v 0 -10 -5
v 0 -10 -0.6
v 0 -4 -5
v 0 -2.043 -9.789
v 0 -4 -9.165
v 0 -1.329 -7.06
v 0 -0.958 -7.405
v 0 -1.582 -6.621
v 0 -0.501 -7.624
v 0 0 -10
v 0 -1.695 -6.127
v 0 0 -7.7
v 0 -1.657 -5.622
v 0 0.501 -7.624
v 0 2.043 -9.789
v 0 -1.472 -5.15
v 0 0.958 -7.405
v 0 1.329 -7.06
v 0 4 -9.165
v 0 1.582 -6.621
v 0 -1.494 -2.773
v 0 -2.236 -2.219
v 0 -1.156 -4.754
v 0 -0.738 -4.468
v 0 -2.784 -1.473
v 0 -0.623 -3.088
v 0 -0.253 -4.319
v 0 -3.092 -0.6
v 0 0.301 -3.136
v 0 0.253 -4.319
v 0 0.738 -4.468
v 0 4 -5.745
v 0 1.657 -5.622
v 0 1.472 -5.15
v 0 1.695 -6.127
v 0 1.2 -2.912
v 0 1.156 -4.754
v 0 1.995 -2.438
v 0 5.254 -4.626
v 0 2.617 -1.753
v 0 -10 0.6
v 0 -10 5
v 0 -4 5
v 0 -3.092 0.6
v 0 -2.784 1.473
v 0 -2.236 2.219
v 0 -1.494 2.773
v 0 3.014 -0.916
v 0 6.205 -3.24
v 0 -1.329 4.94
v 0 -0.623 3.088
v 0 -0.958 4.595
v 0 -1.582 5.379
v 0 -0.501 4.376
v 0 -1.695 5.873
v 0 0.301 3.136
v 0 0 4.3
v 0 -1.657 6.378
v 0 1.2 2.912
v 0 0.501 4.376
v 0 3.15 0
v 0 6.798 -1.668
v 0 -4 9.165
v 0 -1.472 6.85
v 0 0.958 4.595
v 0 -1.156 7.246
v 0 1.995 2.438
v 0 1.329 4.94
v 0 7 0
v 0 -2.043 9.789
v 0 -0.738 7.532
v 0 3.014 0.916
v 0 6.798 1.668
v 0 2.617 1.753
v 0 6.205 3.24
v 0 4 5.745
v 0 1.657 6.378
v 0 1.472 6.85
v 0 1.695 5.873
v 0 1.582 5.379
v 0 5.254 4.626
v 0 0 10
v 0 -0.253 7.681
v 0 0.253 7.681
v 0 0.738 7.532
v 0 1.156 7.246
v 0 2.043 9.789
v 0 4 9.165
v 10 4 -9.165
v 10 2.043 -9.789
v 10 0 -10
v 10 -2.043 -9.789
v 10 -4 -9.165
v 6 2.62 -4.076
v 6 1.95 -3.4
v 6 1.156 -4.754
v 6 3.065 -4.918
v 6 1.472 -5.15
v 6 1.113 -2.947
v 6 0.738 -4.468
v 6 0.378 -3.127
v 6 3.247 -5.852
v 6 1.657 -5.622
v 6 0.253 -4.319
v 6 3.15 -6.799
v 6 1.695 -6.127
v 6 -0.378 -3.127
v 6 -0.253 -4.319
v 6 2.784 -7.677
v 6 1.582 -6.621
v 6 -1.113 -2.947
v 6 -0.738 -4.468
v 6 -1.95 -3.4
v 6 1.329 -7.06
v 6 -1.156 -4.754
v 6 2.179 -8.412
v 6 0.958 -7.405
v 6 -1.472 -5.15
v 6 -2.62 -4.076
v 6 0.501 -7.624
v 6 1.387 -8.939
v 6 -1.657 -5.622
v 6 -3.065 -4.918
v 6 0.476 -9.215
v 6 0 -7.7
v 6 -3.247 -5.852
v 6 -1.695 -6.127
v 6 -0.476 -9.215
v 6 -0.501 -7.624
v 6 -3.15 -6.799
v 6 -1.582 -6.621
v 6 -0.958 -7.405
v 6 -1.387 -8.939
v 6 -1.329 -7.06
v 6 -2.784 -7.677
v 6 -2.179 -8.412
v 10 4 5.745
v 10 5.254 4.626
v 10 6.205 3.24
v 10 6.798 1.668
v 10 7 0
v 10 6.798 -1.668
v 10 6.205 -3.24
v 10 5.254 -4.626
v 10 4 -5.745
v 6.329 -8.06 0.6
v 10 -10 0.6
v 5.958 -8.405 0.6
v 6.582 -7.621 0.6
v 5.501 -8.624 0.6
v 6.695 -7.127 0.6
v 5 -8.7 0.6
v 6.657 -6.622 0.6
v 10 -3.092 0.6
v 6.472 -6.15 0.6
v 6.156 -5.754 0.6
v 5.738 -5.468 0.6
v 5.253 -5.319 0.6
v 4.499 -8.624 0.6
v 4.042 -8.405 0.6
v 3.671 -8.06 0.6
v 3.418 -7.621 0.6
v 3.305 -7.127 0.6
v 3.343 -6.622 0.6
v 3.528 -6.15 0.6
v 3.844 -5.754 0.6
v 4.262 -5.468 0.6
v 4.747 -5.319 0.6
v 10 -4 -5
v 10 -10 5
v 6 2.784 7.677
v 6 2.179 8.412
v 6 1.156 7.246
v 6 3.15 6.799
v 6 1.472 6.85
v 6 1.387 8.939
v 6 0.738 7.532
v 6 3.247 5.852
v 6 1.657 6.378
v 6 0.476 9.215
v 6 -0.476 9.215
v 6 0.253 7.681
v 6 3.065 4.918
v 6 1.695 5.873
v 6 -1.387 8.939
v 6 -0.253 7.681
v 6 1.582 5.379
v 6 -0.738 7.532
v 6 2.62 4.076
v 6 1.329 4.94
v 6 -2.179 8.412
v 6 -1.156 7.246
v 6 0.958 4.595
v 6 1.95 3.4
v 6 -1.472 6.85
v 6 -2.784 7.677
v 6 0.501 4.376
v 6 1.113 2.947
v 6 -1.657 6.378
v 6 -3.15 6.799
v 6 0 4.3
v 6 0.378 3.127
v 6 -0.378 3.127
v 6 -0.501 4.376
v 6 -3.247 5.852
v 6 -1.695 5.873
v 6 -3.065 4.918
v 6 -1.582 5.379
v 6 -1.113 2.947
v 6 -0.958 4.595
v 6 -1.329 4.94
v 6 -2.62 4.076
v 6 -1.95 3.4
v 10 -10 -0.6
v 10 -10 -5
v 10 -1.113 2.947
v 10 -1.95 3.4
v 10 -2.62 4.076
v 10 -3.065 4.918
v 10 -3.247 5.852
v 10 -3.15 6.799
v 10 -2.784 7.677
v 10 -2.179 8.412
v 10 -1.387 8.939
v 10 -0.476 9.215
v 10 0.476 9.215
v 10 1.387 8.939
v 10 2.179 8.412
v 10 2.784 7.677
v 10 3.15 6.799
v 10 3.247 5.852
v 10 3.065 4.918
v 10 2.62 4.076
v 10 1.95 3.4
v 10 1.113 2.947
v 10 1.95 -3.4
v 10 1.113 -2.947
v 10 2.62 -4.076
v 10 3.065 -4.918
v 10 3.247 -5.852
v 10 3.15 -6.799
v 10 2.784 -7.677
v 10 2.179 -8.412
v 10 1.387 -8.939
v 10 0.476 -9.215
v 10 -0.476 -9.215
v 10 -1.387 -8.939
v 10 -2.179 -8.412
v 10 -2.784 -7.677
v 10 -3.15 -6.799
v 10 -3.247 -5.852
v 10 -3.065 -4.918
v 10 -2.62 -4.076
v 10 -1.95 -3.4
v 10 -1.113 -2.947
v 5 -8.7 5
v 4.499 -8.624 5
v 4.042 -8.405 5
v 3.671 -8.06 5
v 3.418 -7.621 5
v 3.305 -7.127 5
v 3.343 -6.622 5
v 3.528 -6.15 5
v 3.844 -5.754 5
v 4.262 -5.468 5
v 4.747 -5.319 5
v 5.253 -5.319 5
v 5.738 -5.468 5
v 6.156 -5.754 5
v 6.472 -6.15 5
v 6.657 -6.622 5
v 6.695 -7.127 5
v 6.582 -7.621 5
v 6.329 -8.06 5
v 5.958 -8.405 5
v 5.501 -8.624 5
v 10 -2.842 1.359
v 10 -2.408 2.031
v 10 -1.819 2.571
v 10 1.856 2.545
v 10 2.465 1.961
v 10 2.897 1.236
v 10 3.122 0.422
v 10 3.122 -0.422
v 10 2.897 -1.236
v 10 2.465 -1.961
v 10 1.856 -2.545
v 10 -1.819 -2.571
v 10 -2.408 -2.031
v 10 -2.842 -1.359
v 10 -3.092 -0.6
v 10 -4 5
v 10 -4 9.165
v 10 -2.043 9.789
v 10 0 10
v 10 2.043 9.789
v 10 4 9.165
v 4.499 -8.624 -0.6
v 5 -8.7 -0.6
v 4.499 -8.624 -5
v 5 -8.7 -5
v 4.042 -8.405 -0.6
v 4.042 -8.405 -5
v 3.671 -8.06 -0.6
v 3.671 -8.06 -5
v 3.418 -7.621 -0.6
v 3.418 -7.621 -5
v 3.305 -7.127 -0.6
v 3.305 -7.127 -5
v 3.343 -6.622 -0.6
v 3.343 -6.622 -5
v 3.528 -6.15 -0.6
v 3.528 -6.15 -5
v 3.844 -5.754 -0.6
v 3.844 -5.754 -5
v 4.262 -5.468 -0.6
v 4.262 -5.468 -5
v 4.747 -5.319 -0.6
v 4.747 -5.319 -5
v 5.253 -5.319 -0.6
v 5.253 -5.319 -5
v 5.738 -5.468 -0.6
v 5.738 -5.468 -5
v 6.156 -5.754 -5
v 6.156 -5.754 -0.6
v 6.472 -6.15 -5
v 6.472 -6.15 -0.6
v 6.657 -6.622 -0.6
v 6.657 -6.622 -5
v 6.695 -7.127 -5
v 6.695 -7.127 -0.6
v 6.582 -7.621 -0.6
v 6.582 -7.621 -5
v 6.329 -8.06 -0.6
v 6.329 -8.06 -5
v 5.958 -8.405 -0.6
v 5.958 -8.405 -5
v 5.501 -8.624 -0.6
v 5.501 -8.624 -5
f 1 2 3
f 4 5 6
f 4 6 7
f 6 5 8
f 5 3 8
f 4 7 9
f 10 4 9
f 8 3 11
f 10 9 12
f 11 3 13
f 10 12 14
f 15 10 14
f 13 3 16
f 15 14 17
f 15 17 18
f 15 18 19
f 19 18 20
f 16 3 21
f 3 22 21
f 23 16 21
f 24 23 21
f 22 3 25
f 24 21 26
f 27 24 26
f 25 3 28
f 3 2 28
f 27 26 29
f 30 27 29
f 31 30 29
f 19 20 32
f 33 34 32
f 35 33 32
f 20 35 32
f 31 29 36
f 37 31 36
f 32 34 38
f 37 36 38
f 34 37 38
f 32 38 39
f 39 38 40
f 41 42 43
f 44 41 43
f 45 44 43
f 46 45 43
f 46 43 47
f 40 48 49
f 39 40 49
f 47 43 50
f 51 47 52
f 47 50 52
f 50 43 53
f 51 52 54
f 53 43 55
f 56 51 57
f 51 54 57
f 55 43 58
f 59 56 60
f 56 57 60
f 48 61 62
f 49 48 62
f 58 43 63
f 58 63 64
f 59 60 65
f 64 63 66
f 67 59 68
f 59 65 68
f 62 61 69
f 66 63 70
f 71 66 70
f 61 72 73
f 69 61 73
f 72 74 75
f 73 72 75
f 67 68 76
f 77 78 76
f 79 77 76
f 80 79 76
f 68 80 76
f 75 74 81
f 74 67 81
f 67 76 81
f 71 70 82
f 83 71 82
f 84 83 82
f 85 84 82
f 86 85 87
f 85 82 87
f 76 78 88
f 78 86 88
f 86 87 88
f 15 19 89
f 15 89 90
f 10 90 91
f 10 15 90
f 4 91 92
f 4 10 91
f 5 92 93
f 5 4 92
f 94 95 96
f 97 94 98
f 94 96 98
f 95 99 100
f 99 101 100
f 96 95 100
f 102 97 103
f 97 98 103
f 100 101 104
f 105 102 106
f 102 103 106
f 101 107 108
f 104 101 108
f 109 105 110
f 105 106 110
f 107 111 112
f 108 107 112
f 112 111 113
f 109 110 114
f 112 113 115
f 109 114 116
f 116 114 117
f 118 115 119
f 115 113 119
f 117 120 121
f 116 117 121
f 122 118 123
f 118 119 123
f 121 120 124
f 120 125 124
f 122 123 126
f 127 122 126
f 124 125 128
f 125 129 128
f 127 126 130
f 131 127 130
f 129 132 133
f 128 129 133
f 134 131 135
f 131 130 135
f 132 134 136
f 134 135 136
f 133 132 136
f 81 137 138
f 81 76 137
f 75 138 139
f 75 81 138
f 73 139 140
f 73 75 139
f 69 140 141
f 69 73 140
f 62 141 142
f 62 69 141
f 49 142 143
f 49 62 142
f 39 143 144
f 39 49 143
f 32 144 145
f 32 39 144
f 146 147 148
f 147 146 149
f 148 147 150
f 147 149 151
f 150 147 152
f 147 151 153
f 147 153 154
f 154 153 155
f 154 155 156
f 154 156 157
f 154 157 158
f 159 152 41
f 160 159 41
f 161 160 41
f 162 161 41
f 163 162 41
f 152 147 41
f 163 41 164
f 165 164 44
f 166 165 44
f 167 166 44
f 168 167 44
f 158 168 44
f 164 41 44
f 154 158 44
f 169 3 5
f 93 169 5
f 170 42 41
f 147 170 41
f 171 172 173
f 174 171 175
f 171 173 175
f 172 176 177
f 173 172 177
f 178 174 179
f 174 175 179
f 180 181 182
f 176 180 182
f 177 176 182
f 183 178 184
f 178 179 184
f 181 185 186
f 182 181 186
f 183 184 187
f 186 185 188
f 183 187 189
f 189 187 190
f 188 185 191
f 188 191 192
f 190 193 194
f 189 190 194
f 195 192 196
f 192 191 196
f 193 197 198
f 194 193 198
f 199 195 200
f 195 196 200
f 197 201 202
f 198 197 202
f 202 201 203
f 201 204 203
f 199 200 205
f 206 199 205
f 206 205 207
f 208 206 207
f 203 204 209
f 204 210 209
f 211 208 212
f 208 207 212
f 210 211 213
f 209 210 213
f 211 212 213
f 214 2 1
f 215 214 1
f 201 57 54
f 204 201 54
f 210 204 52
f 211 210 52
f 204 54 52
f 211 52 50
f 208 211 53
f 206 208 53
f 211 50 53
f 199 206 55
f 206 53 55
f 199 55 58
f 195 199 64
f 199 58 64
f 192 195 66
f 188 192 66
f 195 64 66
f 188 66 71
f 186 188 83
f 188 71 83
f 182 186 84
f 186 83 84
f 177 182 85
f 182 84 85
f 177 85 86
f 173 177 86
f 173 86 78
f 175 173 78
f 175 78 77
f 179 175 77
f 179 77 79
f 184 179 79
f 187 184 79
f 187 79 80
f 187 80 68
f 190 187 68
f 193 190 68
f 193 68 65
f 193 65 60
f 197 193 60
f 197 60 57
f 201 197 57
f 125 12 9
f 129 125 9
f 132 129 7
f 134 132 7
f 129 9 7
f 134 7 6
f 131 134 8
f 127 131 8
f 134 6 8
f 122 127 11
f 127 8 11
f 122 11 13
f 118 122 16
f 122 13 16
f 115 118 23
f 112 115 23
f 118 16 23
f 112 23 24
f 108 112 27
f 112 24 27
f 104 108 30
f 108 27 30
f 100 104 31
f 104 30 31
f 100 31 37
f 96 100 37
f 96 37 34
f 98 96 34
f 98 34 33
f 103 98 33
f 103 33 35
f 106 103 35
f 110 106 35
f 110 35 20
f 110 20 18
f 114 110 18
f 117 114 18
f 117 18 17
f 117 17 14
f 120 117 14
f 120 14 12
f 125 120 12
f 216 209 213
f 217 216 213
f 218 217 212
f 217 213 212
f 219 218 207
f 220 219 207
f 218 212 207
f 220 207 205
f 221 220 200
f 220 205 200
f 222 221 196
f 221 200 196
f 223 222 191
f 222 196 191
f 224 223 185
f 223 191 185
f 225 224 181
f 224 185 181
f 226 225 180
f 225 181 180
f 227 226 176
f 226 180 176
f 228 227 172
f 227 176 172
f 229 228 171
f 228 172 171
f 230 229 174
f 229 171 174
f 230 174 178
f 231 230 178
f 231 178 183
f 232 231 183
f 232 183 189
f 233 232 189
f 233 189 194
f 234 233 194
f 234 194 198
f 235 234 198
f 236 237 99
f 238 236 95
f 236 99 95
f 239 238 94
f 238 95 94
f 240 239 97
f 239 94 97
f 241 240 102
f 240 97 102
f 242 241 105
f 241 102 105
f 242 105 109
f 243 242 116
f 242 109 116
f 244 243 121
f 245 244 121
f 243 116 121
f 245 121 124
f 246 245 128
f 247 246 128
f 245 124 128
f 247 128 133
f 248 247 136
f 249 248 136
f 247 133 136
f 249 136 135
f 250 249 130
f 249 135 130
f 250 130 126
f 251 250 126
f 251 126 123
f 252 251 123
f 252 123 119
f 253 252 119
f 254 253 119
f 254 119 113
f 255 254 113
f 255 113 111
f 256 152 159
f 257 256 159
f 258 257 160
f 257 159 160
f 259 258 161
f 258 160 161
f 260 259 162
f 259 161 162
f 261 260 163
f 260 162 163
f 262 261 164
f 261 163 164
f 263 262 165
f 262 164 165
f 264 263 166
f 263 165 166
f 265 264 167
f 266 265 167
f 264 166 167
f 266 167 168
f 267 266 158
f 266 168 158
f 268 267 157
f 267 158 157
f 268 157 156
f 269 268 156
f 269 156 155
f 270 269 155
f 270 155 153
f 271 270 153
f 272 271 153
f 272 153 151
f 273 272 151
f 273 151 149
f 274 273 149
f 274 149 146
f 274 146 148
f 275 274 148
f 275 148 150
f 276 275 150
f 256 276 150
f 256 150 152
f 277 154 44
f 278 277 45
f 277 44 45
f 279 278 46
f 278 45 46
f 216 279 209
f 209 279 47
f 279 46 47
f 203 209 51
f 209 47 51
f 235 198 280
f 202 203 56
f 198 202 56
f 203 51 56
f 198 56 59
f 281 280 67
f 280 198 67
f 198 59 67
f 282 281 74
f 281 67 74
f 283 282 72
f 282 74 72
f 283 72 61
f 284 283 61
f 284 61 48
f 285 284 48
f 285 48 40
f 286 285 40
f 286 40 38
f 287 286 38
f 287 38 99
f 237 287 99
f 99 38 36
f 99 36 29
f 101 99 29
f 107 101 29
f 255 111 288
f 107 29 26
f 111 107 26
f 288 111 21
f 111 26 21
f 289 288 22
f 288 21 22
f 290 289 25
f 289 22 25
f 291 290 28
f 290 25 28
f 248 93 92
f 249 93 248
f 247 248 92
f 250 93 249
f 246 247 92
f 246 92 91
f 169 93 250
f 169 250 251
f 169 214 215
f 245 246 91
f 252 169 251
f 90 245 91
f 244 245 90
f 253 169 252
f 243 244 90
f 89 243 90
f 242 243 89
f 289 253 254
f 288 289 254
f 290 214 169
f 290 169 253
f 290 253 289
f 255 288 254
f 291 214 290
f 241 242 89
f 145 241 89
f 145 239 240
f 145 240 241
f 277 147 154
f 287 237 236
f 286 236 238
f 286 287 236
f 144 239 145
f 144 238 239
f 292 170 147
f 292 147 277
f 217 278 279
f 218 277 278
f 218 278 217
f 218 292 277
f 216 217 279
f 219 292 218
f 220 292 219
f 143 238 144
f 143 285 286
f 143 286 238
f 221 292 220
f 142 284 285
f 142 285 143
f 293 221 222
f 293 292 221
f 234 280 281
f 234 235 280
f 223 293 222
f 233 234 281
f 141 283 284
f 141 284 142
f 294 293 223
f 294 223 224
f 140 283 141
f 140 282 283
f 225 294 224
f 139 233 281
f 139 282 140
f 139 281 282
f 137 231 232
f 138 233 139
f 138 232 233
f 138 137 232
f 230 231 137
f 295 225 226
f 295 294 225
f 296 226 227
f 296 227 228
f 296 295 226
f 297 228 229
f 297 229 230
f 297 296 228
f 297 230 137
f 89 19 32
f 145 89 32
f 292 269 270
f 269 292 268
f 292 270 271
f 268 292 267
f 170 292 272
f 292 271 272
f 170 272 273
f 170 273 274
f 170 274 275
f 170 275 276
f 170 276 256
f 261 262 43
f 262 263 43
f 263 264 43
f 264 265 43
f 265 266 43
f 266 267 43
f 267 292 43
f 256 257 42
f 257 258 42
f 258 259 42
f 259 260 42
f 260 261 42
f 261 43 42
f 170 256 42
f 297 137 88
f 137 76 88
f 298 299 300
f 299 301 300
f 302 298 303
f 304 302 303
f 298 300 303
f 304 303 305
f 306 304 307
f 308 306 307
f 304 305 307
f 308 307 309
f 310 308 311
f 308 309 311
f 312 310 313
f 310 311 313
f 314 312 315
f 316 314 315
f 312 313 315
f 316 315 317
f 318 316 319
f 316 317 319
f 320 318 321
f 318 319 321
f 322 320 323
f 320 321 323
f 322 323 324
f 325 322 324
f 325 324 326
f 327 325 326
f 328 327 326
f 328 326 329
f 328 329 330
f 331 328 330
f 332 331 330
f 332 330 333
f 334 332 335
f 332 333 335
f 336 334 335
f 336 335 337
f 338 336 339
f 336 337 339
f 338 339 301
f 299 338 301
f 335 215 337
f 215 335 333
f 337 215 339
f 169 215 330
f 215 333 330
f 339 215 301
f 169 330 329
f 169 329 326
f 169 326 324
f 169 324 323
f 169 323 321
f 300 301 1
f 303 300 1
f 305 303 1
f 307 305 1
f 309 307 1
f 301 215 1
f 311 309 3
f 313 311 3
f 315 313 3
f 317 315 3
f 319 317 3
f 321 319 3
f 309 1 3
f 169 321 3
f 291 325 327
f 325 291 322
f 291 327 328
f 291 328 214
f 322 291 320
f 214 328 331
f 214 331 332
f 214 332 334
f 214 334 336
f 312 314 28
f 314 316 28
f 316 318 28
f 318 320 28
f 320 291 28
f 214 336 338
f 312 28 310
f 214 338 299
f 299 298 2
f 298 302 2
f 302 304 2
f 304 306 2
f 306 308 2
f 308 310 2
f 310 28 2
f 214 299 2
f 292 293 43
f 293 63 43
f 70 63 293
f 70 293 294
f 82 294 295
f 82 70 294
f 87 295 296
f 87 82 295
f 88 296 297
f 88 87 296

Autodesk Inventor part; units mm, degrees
ref_plane "YZ Plane" through (0, 0, 0) normal (1, 0, 0) x (0, 1, 0)
ref_plane "XZ Plane" through (0, 0, 0) normal (0, 1, 0) x (-1, 0, 0)
ref_plane "XY Plane" through (0, 0, 0) normal (0, 0, 1) x (1, 0, 0)
sketch "スケッチ1" plane through (0, 0, 0) normal (1, 0, 0) x (0, 1, 0)
  circle A0 centre (0, 0) radius 3.15
  circle A1 centre (0, 0) radius 7
  line L0 (0, 5) -> (-10, 5)
  line L1 (-10, 5) -> (-10, -5)
  line L2 (-10, -5) -> (0, -5)
  line L3 (0, -5) -> (0, 5) construction
  line L4 (-10, 0.6) -> (0, 0.6)
  line L5 (0, 0.6) -> (0, -0.6)
  line L6 (0, -0.6) -> (-10, -0.6)
  line L7 (-10, -0.6) -> (-10, 0.6)
  line L8 (4, 10) -> (-4, 10) construction
  line L9 (-4, 10) -> (-4, -10)
  line L10 (-4, -10) -> (4, -10) construction
  line L11 (4, -10) -> (4, 10)
  line L12 (4, 10) -> (-4, -10) construction
  line L13 (-4, 10) -> (4, -10) construction
  arc A2 (4, 9.1652) -> (-4, 9.1652) centre (0, 0) ccw
  arc A3 (-4, -9.1652) -> (4, -9.1652) centre (0, 0) ccw
  point P0 (-11, 3.3541)
  point P1 (-11, -3.3541)
  point P2 (-4.899, 5)
  point P3 (-4.899, -5)
  point P4 (-3.0923, 0.6)
  point P5 (-3.0923, -0.6)
  point P6 (-6.9742, -0.6)
  point P7 (-6.9742, 0.6)
  point P8 (0, -3.15)
  point P9 (0, 3.15)
  point P10 (0, 0.6)
  point P11 (-4, -5)
  point P12 (4, -5.7446)
  point P13 (4, 5.7446)
  point P14 (-4, 5)
  dimension "d0" = 6.3
  dimension "d1" = 14
  dimension "d2" = 5
  dimension "d3" = 5
  dimension "d4" = 10
  dimension "d18" = 1.2
  dimension "d19" = 0.6
  dimension "d45" = 8
  dimension "d46" = 20
extrude "押し出し1" add sketch "スケッチ1" along normal blind 10 contours A0 L4 L9 A1 L11 L6 | L4 A1 L0 L9 | L9 L2 A1 L6 | L4 L1 L0 A1 | A1 L2 L1 L6 | L9 A2 L11 A1 | A1 L11 A3 L9 | A1 L11
sketch "スケッチ2" plane through (10, 0, 0) normal (1, 0, 0) x (0, 0, -1)
  line L0 (14, 0) -> (-14, 0) projected
  point P0 (0, 0)
  point P1 (-6, 0)
  point P2 (6, 0)
  dimension "d7" = 6
  dimension "d8" = 6
hole "穴1" at (10, 0, 6) at (10, 0, -6) direction (-1, 0, 0) diameter 3.4 end through all counterbore diameter 6.5 counterbore depth 4
sketch "スケッチ3" plane through (0, -4.899, 5) normal (0, 0, 1) x (1, 0, 0)
  line L0 (0, -5.101) -> (10, -5.101) projected
  point P0 (5, -2.101)
  point P1 (5, -5.101)
  dimension "d44" = 3
hole "穴2" at (5, -7, 5) direction (0, 0, -1) diameter 3.4 end through all
equation "\"d3\" = d2"
equation "\"d19\" = 0.5 * d18"
equation "\"d8\" = d7"
properties part number "セットカラ―" material "ABS プラスチック"
